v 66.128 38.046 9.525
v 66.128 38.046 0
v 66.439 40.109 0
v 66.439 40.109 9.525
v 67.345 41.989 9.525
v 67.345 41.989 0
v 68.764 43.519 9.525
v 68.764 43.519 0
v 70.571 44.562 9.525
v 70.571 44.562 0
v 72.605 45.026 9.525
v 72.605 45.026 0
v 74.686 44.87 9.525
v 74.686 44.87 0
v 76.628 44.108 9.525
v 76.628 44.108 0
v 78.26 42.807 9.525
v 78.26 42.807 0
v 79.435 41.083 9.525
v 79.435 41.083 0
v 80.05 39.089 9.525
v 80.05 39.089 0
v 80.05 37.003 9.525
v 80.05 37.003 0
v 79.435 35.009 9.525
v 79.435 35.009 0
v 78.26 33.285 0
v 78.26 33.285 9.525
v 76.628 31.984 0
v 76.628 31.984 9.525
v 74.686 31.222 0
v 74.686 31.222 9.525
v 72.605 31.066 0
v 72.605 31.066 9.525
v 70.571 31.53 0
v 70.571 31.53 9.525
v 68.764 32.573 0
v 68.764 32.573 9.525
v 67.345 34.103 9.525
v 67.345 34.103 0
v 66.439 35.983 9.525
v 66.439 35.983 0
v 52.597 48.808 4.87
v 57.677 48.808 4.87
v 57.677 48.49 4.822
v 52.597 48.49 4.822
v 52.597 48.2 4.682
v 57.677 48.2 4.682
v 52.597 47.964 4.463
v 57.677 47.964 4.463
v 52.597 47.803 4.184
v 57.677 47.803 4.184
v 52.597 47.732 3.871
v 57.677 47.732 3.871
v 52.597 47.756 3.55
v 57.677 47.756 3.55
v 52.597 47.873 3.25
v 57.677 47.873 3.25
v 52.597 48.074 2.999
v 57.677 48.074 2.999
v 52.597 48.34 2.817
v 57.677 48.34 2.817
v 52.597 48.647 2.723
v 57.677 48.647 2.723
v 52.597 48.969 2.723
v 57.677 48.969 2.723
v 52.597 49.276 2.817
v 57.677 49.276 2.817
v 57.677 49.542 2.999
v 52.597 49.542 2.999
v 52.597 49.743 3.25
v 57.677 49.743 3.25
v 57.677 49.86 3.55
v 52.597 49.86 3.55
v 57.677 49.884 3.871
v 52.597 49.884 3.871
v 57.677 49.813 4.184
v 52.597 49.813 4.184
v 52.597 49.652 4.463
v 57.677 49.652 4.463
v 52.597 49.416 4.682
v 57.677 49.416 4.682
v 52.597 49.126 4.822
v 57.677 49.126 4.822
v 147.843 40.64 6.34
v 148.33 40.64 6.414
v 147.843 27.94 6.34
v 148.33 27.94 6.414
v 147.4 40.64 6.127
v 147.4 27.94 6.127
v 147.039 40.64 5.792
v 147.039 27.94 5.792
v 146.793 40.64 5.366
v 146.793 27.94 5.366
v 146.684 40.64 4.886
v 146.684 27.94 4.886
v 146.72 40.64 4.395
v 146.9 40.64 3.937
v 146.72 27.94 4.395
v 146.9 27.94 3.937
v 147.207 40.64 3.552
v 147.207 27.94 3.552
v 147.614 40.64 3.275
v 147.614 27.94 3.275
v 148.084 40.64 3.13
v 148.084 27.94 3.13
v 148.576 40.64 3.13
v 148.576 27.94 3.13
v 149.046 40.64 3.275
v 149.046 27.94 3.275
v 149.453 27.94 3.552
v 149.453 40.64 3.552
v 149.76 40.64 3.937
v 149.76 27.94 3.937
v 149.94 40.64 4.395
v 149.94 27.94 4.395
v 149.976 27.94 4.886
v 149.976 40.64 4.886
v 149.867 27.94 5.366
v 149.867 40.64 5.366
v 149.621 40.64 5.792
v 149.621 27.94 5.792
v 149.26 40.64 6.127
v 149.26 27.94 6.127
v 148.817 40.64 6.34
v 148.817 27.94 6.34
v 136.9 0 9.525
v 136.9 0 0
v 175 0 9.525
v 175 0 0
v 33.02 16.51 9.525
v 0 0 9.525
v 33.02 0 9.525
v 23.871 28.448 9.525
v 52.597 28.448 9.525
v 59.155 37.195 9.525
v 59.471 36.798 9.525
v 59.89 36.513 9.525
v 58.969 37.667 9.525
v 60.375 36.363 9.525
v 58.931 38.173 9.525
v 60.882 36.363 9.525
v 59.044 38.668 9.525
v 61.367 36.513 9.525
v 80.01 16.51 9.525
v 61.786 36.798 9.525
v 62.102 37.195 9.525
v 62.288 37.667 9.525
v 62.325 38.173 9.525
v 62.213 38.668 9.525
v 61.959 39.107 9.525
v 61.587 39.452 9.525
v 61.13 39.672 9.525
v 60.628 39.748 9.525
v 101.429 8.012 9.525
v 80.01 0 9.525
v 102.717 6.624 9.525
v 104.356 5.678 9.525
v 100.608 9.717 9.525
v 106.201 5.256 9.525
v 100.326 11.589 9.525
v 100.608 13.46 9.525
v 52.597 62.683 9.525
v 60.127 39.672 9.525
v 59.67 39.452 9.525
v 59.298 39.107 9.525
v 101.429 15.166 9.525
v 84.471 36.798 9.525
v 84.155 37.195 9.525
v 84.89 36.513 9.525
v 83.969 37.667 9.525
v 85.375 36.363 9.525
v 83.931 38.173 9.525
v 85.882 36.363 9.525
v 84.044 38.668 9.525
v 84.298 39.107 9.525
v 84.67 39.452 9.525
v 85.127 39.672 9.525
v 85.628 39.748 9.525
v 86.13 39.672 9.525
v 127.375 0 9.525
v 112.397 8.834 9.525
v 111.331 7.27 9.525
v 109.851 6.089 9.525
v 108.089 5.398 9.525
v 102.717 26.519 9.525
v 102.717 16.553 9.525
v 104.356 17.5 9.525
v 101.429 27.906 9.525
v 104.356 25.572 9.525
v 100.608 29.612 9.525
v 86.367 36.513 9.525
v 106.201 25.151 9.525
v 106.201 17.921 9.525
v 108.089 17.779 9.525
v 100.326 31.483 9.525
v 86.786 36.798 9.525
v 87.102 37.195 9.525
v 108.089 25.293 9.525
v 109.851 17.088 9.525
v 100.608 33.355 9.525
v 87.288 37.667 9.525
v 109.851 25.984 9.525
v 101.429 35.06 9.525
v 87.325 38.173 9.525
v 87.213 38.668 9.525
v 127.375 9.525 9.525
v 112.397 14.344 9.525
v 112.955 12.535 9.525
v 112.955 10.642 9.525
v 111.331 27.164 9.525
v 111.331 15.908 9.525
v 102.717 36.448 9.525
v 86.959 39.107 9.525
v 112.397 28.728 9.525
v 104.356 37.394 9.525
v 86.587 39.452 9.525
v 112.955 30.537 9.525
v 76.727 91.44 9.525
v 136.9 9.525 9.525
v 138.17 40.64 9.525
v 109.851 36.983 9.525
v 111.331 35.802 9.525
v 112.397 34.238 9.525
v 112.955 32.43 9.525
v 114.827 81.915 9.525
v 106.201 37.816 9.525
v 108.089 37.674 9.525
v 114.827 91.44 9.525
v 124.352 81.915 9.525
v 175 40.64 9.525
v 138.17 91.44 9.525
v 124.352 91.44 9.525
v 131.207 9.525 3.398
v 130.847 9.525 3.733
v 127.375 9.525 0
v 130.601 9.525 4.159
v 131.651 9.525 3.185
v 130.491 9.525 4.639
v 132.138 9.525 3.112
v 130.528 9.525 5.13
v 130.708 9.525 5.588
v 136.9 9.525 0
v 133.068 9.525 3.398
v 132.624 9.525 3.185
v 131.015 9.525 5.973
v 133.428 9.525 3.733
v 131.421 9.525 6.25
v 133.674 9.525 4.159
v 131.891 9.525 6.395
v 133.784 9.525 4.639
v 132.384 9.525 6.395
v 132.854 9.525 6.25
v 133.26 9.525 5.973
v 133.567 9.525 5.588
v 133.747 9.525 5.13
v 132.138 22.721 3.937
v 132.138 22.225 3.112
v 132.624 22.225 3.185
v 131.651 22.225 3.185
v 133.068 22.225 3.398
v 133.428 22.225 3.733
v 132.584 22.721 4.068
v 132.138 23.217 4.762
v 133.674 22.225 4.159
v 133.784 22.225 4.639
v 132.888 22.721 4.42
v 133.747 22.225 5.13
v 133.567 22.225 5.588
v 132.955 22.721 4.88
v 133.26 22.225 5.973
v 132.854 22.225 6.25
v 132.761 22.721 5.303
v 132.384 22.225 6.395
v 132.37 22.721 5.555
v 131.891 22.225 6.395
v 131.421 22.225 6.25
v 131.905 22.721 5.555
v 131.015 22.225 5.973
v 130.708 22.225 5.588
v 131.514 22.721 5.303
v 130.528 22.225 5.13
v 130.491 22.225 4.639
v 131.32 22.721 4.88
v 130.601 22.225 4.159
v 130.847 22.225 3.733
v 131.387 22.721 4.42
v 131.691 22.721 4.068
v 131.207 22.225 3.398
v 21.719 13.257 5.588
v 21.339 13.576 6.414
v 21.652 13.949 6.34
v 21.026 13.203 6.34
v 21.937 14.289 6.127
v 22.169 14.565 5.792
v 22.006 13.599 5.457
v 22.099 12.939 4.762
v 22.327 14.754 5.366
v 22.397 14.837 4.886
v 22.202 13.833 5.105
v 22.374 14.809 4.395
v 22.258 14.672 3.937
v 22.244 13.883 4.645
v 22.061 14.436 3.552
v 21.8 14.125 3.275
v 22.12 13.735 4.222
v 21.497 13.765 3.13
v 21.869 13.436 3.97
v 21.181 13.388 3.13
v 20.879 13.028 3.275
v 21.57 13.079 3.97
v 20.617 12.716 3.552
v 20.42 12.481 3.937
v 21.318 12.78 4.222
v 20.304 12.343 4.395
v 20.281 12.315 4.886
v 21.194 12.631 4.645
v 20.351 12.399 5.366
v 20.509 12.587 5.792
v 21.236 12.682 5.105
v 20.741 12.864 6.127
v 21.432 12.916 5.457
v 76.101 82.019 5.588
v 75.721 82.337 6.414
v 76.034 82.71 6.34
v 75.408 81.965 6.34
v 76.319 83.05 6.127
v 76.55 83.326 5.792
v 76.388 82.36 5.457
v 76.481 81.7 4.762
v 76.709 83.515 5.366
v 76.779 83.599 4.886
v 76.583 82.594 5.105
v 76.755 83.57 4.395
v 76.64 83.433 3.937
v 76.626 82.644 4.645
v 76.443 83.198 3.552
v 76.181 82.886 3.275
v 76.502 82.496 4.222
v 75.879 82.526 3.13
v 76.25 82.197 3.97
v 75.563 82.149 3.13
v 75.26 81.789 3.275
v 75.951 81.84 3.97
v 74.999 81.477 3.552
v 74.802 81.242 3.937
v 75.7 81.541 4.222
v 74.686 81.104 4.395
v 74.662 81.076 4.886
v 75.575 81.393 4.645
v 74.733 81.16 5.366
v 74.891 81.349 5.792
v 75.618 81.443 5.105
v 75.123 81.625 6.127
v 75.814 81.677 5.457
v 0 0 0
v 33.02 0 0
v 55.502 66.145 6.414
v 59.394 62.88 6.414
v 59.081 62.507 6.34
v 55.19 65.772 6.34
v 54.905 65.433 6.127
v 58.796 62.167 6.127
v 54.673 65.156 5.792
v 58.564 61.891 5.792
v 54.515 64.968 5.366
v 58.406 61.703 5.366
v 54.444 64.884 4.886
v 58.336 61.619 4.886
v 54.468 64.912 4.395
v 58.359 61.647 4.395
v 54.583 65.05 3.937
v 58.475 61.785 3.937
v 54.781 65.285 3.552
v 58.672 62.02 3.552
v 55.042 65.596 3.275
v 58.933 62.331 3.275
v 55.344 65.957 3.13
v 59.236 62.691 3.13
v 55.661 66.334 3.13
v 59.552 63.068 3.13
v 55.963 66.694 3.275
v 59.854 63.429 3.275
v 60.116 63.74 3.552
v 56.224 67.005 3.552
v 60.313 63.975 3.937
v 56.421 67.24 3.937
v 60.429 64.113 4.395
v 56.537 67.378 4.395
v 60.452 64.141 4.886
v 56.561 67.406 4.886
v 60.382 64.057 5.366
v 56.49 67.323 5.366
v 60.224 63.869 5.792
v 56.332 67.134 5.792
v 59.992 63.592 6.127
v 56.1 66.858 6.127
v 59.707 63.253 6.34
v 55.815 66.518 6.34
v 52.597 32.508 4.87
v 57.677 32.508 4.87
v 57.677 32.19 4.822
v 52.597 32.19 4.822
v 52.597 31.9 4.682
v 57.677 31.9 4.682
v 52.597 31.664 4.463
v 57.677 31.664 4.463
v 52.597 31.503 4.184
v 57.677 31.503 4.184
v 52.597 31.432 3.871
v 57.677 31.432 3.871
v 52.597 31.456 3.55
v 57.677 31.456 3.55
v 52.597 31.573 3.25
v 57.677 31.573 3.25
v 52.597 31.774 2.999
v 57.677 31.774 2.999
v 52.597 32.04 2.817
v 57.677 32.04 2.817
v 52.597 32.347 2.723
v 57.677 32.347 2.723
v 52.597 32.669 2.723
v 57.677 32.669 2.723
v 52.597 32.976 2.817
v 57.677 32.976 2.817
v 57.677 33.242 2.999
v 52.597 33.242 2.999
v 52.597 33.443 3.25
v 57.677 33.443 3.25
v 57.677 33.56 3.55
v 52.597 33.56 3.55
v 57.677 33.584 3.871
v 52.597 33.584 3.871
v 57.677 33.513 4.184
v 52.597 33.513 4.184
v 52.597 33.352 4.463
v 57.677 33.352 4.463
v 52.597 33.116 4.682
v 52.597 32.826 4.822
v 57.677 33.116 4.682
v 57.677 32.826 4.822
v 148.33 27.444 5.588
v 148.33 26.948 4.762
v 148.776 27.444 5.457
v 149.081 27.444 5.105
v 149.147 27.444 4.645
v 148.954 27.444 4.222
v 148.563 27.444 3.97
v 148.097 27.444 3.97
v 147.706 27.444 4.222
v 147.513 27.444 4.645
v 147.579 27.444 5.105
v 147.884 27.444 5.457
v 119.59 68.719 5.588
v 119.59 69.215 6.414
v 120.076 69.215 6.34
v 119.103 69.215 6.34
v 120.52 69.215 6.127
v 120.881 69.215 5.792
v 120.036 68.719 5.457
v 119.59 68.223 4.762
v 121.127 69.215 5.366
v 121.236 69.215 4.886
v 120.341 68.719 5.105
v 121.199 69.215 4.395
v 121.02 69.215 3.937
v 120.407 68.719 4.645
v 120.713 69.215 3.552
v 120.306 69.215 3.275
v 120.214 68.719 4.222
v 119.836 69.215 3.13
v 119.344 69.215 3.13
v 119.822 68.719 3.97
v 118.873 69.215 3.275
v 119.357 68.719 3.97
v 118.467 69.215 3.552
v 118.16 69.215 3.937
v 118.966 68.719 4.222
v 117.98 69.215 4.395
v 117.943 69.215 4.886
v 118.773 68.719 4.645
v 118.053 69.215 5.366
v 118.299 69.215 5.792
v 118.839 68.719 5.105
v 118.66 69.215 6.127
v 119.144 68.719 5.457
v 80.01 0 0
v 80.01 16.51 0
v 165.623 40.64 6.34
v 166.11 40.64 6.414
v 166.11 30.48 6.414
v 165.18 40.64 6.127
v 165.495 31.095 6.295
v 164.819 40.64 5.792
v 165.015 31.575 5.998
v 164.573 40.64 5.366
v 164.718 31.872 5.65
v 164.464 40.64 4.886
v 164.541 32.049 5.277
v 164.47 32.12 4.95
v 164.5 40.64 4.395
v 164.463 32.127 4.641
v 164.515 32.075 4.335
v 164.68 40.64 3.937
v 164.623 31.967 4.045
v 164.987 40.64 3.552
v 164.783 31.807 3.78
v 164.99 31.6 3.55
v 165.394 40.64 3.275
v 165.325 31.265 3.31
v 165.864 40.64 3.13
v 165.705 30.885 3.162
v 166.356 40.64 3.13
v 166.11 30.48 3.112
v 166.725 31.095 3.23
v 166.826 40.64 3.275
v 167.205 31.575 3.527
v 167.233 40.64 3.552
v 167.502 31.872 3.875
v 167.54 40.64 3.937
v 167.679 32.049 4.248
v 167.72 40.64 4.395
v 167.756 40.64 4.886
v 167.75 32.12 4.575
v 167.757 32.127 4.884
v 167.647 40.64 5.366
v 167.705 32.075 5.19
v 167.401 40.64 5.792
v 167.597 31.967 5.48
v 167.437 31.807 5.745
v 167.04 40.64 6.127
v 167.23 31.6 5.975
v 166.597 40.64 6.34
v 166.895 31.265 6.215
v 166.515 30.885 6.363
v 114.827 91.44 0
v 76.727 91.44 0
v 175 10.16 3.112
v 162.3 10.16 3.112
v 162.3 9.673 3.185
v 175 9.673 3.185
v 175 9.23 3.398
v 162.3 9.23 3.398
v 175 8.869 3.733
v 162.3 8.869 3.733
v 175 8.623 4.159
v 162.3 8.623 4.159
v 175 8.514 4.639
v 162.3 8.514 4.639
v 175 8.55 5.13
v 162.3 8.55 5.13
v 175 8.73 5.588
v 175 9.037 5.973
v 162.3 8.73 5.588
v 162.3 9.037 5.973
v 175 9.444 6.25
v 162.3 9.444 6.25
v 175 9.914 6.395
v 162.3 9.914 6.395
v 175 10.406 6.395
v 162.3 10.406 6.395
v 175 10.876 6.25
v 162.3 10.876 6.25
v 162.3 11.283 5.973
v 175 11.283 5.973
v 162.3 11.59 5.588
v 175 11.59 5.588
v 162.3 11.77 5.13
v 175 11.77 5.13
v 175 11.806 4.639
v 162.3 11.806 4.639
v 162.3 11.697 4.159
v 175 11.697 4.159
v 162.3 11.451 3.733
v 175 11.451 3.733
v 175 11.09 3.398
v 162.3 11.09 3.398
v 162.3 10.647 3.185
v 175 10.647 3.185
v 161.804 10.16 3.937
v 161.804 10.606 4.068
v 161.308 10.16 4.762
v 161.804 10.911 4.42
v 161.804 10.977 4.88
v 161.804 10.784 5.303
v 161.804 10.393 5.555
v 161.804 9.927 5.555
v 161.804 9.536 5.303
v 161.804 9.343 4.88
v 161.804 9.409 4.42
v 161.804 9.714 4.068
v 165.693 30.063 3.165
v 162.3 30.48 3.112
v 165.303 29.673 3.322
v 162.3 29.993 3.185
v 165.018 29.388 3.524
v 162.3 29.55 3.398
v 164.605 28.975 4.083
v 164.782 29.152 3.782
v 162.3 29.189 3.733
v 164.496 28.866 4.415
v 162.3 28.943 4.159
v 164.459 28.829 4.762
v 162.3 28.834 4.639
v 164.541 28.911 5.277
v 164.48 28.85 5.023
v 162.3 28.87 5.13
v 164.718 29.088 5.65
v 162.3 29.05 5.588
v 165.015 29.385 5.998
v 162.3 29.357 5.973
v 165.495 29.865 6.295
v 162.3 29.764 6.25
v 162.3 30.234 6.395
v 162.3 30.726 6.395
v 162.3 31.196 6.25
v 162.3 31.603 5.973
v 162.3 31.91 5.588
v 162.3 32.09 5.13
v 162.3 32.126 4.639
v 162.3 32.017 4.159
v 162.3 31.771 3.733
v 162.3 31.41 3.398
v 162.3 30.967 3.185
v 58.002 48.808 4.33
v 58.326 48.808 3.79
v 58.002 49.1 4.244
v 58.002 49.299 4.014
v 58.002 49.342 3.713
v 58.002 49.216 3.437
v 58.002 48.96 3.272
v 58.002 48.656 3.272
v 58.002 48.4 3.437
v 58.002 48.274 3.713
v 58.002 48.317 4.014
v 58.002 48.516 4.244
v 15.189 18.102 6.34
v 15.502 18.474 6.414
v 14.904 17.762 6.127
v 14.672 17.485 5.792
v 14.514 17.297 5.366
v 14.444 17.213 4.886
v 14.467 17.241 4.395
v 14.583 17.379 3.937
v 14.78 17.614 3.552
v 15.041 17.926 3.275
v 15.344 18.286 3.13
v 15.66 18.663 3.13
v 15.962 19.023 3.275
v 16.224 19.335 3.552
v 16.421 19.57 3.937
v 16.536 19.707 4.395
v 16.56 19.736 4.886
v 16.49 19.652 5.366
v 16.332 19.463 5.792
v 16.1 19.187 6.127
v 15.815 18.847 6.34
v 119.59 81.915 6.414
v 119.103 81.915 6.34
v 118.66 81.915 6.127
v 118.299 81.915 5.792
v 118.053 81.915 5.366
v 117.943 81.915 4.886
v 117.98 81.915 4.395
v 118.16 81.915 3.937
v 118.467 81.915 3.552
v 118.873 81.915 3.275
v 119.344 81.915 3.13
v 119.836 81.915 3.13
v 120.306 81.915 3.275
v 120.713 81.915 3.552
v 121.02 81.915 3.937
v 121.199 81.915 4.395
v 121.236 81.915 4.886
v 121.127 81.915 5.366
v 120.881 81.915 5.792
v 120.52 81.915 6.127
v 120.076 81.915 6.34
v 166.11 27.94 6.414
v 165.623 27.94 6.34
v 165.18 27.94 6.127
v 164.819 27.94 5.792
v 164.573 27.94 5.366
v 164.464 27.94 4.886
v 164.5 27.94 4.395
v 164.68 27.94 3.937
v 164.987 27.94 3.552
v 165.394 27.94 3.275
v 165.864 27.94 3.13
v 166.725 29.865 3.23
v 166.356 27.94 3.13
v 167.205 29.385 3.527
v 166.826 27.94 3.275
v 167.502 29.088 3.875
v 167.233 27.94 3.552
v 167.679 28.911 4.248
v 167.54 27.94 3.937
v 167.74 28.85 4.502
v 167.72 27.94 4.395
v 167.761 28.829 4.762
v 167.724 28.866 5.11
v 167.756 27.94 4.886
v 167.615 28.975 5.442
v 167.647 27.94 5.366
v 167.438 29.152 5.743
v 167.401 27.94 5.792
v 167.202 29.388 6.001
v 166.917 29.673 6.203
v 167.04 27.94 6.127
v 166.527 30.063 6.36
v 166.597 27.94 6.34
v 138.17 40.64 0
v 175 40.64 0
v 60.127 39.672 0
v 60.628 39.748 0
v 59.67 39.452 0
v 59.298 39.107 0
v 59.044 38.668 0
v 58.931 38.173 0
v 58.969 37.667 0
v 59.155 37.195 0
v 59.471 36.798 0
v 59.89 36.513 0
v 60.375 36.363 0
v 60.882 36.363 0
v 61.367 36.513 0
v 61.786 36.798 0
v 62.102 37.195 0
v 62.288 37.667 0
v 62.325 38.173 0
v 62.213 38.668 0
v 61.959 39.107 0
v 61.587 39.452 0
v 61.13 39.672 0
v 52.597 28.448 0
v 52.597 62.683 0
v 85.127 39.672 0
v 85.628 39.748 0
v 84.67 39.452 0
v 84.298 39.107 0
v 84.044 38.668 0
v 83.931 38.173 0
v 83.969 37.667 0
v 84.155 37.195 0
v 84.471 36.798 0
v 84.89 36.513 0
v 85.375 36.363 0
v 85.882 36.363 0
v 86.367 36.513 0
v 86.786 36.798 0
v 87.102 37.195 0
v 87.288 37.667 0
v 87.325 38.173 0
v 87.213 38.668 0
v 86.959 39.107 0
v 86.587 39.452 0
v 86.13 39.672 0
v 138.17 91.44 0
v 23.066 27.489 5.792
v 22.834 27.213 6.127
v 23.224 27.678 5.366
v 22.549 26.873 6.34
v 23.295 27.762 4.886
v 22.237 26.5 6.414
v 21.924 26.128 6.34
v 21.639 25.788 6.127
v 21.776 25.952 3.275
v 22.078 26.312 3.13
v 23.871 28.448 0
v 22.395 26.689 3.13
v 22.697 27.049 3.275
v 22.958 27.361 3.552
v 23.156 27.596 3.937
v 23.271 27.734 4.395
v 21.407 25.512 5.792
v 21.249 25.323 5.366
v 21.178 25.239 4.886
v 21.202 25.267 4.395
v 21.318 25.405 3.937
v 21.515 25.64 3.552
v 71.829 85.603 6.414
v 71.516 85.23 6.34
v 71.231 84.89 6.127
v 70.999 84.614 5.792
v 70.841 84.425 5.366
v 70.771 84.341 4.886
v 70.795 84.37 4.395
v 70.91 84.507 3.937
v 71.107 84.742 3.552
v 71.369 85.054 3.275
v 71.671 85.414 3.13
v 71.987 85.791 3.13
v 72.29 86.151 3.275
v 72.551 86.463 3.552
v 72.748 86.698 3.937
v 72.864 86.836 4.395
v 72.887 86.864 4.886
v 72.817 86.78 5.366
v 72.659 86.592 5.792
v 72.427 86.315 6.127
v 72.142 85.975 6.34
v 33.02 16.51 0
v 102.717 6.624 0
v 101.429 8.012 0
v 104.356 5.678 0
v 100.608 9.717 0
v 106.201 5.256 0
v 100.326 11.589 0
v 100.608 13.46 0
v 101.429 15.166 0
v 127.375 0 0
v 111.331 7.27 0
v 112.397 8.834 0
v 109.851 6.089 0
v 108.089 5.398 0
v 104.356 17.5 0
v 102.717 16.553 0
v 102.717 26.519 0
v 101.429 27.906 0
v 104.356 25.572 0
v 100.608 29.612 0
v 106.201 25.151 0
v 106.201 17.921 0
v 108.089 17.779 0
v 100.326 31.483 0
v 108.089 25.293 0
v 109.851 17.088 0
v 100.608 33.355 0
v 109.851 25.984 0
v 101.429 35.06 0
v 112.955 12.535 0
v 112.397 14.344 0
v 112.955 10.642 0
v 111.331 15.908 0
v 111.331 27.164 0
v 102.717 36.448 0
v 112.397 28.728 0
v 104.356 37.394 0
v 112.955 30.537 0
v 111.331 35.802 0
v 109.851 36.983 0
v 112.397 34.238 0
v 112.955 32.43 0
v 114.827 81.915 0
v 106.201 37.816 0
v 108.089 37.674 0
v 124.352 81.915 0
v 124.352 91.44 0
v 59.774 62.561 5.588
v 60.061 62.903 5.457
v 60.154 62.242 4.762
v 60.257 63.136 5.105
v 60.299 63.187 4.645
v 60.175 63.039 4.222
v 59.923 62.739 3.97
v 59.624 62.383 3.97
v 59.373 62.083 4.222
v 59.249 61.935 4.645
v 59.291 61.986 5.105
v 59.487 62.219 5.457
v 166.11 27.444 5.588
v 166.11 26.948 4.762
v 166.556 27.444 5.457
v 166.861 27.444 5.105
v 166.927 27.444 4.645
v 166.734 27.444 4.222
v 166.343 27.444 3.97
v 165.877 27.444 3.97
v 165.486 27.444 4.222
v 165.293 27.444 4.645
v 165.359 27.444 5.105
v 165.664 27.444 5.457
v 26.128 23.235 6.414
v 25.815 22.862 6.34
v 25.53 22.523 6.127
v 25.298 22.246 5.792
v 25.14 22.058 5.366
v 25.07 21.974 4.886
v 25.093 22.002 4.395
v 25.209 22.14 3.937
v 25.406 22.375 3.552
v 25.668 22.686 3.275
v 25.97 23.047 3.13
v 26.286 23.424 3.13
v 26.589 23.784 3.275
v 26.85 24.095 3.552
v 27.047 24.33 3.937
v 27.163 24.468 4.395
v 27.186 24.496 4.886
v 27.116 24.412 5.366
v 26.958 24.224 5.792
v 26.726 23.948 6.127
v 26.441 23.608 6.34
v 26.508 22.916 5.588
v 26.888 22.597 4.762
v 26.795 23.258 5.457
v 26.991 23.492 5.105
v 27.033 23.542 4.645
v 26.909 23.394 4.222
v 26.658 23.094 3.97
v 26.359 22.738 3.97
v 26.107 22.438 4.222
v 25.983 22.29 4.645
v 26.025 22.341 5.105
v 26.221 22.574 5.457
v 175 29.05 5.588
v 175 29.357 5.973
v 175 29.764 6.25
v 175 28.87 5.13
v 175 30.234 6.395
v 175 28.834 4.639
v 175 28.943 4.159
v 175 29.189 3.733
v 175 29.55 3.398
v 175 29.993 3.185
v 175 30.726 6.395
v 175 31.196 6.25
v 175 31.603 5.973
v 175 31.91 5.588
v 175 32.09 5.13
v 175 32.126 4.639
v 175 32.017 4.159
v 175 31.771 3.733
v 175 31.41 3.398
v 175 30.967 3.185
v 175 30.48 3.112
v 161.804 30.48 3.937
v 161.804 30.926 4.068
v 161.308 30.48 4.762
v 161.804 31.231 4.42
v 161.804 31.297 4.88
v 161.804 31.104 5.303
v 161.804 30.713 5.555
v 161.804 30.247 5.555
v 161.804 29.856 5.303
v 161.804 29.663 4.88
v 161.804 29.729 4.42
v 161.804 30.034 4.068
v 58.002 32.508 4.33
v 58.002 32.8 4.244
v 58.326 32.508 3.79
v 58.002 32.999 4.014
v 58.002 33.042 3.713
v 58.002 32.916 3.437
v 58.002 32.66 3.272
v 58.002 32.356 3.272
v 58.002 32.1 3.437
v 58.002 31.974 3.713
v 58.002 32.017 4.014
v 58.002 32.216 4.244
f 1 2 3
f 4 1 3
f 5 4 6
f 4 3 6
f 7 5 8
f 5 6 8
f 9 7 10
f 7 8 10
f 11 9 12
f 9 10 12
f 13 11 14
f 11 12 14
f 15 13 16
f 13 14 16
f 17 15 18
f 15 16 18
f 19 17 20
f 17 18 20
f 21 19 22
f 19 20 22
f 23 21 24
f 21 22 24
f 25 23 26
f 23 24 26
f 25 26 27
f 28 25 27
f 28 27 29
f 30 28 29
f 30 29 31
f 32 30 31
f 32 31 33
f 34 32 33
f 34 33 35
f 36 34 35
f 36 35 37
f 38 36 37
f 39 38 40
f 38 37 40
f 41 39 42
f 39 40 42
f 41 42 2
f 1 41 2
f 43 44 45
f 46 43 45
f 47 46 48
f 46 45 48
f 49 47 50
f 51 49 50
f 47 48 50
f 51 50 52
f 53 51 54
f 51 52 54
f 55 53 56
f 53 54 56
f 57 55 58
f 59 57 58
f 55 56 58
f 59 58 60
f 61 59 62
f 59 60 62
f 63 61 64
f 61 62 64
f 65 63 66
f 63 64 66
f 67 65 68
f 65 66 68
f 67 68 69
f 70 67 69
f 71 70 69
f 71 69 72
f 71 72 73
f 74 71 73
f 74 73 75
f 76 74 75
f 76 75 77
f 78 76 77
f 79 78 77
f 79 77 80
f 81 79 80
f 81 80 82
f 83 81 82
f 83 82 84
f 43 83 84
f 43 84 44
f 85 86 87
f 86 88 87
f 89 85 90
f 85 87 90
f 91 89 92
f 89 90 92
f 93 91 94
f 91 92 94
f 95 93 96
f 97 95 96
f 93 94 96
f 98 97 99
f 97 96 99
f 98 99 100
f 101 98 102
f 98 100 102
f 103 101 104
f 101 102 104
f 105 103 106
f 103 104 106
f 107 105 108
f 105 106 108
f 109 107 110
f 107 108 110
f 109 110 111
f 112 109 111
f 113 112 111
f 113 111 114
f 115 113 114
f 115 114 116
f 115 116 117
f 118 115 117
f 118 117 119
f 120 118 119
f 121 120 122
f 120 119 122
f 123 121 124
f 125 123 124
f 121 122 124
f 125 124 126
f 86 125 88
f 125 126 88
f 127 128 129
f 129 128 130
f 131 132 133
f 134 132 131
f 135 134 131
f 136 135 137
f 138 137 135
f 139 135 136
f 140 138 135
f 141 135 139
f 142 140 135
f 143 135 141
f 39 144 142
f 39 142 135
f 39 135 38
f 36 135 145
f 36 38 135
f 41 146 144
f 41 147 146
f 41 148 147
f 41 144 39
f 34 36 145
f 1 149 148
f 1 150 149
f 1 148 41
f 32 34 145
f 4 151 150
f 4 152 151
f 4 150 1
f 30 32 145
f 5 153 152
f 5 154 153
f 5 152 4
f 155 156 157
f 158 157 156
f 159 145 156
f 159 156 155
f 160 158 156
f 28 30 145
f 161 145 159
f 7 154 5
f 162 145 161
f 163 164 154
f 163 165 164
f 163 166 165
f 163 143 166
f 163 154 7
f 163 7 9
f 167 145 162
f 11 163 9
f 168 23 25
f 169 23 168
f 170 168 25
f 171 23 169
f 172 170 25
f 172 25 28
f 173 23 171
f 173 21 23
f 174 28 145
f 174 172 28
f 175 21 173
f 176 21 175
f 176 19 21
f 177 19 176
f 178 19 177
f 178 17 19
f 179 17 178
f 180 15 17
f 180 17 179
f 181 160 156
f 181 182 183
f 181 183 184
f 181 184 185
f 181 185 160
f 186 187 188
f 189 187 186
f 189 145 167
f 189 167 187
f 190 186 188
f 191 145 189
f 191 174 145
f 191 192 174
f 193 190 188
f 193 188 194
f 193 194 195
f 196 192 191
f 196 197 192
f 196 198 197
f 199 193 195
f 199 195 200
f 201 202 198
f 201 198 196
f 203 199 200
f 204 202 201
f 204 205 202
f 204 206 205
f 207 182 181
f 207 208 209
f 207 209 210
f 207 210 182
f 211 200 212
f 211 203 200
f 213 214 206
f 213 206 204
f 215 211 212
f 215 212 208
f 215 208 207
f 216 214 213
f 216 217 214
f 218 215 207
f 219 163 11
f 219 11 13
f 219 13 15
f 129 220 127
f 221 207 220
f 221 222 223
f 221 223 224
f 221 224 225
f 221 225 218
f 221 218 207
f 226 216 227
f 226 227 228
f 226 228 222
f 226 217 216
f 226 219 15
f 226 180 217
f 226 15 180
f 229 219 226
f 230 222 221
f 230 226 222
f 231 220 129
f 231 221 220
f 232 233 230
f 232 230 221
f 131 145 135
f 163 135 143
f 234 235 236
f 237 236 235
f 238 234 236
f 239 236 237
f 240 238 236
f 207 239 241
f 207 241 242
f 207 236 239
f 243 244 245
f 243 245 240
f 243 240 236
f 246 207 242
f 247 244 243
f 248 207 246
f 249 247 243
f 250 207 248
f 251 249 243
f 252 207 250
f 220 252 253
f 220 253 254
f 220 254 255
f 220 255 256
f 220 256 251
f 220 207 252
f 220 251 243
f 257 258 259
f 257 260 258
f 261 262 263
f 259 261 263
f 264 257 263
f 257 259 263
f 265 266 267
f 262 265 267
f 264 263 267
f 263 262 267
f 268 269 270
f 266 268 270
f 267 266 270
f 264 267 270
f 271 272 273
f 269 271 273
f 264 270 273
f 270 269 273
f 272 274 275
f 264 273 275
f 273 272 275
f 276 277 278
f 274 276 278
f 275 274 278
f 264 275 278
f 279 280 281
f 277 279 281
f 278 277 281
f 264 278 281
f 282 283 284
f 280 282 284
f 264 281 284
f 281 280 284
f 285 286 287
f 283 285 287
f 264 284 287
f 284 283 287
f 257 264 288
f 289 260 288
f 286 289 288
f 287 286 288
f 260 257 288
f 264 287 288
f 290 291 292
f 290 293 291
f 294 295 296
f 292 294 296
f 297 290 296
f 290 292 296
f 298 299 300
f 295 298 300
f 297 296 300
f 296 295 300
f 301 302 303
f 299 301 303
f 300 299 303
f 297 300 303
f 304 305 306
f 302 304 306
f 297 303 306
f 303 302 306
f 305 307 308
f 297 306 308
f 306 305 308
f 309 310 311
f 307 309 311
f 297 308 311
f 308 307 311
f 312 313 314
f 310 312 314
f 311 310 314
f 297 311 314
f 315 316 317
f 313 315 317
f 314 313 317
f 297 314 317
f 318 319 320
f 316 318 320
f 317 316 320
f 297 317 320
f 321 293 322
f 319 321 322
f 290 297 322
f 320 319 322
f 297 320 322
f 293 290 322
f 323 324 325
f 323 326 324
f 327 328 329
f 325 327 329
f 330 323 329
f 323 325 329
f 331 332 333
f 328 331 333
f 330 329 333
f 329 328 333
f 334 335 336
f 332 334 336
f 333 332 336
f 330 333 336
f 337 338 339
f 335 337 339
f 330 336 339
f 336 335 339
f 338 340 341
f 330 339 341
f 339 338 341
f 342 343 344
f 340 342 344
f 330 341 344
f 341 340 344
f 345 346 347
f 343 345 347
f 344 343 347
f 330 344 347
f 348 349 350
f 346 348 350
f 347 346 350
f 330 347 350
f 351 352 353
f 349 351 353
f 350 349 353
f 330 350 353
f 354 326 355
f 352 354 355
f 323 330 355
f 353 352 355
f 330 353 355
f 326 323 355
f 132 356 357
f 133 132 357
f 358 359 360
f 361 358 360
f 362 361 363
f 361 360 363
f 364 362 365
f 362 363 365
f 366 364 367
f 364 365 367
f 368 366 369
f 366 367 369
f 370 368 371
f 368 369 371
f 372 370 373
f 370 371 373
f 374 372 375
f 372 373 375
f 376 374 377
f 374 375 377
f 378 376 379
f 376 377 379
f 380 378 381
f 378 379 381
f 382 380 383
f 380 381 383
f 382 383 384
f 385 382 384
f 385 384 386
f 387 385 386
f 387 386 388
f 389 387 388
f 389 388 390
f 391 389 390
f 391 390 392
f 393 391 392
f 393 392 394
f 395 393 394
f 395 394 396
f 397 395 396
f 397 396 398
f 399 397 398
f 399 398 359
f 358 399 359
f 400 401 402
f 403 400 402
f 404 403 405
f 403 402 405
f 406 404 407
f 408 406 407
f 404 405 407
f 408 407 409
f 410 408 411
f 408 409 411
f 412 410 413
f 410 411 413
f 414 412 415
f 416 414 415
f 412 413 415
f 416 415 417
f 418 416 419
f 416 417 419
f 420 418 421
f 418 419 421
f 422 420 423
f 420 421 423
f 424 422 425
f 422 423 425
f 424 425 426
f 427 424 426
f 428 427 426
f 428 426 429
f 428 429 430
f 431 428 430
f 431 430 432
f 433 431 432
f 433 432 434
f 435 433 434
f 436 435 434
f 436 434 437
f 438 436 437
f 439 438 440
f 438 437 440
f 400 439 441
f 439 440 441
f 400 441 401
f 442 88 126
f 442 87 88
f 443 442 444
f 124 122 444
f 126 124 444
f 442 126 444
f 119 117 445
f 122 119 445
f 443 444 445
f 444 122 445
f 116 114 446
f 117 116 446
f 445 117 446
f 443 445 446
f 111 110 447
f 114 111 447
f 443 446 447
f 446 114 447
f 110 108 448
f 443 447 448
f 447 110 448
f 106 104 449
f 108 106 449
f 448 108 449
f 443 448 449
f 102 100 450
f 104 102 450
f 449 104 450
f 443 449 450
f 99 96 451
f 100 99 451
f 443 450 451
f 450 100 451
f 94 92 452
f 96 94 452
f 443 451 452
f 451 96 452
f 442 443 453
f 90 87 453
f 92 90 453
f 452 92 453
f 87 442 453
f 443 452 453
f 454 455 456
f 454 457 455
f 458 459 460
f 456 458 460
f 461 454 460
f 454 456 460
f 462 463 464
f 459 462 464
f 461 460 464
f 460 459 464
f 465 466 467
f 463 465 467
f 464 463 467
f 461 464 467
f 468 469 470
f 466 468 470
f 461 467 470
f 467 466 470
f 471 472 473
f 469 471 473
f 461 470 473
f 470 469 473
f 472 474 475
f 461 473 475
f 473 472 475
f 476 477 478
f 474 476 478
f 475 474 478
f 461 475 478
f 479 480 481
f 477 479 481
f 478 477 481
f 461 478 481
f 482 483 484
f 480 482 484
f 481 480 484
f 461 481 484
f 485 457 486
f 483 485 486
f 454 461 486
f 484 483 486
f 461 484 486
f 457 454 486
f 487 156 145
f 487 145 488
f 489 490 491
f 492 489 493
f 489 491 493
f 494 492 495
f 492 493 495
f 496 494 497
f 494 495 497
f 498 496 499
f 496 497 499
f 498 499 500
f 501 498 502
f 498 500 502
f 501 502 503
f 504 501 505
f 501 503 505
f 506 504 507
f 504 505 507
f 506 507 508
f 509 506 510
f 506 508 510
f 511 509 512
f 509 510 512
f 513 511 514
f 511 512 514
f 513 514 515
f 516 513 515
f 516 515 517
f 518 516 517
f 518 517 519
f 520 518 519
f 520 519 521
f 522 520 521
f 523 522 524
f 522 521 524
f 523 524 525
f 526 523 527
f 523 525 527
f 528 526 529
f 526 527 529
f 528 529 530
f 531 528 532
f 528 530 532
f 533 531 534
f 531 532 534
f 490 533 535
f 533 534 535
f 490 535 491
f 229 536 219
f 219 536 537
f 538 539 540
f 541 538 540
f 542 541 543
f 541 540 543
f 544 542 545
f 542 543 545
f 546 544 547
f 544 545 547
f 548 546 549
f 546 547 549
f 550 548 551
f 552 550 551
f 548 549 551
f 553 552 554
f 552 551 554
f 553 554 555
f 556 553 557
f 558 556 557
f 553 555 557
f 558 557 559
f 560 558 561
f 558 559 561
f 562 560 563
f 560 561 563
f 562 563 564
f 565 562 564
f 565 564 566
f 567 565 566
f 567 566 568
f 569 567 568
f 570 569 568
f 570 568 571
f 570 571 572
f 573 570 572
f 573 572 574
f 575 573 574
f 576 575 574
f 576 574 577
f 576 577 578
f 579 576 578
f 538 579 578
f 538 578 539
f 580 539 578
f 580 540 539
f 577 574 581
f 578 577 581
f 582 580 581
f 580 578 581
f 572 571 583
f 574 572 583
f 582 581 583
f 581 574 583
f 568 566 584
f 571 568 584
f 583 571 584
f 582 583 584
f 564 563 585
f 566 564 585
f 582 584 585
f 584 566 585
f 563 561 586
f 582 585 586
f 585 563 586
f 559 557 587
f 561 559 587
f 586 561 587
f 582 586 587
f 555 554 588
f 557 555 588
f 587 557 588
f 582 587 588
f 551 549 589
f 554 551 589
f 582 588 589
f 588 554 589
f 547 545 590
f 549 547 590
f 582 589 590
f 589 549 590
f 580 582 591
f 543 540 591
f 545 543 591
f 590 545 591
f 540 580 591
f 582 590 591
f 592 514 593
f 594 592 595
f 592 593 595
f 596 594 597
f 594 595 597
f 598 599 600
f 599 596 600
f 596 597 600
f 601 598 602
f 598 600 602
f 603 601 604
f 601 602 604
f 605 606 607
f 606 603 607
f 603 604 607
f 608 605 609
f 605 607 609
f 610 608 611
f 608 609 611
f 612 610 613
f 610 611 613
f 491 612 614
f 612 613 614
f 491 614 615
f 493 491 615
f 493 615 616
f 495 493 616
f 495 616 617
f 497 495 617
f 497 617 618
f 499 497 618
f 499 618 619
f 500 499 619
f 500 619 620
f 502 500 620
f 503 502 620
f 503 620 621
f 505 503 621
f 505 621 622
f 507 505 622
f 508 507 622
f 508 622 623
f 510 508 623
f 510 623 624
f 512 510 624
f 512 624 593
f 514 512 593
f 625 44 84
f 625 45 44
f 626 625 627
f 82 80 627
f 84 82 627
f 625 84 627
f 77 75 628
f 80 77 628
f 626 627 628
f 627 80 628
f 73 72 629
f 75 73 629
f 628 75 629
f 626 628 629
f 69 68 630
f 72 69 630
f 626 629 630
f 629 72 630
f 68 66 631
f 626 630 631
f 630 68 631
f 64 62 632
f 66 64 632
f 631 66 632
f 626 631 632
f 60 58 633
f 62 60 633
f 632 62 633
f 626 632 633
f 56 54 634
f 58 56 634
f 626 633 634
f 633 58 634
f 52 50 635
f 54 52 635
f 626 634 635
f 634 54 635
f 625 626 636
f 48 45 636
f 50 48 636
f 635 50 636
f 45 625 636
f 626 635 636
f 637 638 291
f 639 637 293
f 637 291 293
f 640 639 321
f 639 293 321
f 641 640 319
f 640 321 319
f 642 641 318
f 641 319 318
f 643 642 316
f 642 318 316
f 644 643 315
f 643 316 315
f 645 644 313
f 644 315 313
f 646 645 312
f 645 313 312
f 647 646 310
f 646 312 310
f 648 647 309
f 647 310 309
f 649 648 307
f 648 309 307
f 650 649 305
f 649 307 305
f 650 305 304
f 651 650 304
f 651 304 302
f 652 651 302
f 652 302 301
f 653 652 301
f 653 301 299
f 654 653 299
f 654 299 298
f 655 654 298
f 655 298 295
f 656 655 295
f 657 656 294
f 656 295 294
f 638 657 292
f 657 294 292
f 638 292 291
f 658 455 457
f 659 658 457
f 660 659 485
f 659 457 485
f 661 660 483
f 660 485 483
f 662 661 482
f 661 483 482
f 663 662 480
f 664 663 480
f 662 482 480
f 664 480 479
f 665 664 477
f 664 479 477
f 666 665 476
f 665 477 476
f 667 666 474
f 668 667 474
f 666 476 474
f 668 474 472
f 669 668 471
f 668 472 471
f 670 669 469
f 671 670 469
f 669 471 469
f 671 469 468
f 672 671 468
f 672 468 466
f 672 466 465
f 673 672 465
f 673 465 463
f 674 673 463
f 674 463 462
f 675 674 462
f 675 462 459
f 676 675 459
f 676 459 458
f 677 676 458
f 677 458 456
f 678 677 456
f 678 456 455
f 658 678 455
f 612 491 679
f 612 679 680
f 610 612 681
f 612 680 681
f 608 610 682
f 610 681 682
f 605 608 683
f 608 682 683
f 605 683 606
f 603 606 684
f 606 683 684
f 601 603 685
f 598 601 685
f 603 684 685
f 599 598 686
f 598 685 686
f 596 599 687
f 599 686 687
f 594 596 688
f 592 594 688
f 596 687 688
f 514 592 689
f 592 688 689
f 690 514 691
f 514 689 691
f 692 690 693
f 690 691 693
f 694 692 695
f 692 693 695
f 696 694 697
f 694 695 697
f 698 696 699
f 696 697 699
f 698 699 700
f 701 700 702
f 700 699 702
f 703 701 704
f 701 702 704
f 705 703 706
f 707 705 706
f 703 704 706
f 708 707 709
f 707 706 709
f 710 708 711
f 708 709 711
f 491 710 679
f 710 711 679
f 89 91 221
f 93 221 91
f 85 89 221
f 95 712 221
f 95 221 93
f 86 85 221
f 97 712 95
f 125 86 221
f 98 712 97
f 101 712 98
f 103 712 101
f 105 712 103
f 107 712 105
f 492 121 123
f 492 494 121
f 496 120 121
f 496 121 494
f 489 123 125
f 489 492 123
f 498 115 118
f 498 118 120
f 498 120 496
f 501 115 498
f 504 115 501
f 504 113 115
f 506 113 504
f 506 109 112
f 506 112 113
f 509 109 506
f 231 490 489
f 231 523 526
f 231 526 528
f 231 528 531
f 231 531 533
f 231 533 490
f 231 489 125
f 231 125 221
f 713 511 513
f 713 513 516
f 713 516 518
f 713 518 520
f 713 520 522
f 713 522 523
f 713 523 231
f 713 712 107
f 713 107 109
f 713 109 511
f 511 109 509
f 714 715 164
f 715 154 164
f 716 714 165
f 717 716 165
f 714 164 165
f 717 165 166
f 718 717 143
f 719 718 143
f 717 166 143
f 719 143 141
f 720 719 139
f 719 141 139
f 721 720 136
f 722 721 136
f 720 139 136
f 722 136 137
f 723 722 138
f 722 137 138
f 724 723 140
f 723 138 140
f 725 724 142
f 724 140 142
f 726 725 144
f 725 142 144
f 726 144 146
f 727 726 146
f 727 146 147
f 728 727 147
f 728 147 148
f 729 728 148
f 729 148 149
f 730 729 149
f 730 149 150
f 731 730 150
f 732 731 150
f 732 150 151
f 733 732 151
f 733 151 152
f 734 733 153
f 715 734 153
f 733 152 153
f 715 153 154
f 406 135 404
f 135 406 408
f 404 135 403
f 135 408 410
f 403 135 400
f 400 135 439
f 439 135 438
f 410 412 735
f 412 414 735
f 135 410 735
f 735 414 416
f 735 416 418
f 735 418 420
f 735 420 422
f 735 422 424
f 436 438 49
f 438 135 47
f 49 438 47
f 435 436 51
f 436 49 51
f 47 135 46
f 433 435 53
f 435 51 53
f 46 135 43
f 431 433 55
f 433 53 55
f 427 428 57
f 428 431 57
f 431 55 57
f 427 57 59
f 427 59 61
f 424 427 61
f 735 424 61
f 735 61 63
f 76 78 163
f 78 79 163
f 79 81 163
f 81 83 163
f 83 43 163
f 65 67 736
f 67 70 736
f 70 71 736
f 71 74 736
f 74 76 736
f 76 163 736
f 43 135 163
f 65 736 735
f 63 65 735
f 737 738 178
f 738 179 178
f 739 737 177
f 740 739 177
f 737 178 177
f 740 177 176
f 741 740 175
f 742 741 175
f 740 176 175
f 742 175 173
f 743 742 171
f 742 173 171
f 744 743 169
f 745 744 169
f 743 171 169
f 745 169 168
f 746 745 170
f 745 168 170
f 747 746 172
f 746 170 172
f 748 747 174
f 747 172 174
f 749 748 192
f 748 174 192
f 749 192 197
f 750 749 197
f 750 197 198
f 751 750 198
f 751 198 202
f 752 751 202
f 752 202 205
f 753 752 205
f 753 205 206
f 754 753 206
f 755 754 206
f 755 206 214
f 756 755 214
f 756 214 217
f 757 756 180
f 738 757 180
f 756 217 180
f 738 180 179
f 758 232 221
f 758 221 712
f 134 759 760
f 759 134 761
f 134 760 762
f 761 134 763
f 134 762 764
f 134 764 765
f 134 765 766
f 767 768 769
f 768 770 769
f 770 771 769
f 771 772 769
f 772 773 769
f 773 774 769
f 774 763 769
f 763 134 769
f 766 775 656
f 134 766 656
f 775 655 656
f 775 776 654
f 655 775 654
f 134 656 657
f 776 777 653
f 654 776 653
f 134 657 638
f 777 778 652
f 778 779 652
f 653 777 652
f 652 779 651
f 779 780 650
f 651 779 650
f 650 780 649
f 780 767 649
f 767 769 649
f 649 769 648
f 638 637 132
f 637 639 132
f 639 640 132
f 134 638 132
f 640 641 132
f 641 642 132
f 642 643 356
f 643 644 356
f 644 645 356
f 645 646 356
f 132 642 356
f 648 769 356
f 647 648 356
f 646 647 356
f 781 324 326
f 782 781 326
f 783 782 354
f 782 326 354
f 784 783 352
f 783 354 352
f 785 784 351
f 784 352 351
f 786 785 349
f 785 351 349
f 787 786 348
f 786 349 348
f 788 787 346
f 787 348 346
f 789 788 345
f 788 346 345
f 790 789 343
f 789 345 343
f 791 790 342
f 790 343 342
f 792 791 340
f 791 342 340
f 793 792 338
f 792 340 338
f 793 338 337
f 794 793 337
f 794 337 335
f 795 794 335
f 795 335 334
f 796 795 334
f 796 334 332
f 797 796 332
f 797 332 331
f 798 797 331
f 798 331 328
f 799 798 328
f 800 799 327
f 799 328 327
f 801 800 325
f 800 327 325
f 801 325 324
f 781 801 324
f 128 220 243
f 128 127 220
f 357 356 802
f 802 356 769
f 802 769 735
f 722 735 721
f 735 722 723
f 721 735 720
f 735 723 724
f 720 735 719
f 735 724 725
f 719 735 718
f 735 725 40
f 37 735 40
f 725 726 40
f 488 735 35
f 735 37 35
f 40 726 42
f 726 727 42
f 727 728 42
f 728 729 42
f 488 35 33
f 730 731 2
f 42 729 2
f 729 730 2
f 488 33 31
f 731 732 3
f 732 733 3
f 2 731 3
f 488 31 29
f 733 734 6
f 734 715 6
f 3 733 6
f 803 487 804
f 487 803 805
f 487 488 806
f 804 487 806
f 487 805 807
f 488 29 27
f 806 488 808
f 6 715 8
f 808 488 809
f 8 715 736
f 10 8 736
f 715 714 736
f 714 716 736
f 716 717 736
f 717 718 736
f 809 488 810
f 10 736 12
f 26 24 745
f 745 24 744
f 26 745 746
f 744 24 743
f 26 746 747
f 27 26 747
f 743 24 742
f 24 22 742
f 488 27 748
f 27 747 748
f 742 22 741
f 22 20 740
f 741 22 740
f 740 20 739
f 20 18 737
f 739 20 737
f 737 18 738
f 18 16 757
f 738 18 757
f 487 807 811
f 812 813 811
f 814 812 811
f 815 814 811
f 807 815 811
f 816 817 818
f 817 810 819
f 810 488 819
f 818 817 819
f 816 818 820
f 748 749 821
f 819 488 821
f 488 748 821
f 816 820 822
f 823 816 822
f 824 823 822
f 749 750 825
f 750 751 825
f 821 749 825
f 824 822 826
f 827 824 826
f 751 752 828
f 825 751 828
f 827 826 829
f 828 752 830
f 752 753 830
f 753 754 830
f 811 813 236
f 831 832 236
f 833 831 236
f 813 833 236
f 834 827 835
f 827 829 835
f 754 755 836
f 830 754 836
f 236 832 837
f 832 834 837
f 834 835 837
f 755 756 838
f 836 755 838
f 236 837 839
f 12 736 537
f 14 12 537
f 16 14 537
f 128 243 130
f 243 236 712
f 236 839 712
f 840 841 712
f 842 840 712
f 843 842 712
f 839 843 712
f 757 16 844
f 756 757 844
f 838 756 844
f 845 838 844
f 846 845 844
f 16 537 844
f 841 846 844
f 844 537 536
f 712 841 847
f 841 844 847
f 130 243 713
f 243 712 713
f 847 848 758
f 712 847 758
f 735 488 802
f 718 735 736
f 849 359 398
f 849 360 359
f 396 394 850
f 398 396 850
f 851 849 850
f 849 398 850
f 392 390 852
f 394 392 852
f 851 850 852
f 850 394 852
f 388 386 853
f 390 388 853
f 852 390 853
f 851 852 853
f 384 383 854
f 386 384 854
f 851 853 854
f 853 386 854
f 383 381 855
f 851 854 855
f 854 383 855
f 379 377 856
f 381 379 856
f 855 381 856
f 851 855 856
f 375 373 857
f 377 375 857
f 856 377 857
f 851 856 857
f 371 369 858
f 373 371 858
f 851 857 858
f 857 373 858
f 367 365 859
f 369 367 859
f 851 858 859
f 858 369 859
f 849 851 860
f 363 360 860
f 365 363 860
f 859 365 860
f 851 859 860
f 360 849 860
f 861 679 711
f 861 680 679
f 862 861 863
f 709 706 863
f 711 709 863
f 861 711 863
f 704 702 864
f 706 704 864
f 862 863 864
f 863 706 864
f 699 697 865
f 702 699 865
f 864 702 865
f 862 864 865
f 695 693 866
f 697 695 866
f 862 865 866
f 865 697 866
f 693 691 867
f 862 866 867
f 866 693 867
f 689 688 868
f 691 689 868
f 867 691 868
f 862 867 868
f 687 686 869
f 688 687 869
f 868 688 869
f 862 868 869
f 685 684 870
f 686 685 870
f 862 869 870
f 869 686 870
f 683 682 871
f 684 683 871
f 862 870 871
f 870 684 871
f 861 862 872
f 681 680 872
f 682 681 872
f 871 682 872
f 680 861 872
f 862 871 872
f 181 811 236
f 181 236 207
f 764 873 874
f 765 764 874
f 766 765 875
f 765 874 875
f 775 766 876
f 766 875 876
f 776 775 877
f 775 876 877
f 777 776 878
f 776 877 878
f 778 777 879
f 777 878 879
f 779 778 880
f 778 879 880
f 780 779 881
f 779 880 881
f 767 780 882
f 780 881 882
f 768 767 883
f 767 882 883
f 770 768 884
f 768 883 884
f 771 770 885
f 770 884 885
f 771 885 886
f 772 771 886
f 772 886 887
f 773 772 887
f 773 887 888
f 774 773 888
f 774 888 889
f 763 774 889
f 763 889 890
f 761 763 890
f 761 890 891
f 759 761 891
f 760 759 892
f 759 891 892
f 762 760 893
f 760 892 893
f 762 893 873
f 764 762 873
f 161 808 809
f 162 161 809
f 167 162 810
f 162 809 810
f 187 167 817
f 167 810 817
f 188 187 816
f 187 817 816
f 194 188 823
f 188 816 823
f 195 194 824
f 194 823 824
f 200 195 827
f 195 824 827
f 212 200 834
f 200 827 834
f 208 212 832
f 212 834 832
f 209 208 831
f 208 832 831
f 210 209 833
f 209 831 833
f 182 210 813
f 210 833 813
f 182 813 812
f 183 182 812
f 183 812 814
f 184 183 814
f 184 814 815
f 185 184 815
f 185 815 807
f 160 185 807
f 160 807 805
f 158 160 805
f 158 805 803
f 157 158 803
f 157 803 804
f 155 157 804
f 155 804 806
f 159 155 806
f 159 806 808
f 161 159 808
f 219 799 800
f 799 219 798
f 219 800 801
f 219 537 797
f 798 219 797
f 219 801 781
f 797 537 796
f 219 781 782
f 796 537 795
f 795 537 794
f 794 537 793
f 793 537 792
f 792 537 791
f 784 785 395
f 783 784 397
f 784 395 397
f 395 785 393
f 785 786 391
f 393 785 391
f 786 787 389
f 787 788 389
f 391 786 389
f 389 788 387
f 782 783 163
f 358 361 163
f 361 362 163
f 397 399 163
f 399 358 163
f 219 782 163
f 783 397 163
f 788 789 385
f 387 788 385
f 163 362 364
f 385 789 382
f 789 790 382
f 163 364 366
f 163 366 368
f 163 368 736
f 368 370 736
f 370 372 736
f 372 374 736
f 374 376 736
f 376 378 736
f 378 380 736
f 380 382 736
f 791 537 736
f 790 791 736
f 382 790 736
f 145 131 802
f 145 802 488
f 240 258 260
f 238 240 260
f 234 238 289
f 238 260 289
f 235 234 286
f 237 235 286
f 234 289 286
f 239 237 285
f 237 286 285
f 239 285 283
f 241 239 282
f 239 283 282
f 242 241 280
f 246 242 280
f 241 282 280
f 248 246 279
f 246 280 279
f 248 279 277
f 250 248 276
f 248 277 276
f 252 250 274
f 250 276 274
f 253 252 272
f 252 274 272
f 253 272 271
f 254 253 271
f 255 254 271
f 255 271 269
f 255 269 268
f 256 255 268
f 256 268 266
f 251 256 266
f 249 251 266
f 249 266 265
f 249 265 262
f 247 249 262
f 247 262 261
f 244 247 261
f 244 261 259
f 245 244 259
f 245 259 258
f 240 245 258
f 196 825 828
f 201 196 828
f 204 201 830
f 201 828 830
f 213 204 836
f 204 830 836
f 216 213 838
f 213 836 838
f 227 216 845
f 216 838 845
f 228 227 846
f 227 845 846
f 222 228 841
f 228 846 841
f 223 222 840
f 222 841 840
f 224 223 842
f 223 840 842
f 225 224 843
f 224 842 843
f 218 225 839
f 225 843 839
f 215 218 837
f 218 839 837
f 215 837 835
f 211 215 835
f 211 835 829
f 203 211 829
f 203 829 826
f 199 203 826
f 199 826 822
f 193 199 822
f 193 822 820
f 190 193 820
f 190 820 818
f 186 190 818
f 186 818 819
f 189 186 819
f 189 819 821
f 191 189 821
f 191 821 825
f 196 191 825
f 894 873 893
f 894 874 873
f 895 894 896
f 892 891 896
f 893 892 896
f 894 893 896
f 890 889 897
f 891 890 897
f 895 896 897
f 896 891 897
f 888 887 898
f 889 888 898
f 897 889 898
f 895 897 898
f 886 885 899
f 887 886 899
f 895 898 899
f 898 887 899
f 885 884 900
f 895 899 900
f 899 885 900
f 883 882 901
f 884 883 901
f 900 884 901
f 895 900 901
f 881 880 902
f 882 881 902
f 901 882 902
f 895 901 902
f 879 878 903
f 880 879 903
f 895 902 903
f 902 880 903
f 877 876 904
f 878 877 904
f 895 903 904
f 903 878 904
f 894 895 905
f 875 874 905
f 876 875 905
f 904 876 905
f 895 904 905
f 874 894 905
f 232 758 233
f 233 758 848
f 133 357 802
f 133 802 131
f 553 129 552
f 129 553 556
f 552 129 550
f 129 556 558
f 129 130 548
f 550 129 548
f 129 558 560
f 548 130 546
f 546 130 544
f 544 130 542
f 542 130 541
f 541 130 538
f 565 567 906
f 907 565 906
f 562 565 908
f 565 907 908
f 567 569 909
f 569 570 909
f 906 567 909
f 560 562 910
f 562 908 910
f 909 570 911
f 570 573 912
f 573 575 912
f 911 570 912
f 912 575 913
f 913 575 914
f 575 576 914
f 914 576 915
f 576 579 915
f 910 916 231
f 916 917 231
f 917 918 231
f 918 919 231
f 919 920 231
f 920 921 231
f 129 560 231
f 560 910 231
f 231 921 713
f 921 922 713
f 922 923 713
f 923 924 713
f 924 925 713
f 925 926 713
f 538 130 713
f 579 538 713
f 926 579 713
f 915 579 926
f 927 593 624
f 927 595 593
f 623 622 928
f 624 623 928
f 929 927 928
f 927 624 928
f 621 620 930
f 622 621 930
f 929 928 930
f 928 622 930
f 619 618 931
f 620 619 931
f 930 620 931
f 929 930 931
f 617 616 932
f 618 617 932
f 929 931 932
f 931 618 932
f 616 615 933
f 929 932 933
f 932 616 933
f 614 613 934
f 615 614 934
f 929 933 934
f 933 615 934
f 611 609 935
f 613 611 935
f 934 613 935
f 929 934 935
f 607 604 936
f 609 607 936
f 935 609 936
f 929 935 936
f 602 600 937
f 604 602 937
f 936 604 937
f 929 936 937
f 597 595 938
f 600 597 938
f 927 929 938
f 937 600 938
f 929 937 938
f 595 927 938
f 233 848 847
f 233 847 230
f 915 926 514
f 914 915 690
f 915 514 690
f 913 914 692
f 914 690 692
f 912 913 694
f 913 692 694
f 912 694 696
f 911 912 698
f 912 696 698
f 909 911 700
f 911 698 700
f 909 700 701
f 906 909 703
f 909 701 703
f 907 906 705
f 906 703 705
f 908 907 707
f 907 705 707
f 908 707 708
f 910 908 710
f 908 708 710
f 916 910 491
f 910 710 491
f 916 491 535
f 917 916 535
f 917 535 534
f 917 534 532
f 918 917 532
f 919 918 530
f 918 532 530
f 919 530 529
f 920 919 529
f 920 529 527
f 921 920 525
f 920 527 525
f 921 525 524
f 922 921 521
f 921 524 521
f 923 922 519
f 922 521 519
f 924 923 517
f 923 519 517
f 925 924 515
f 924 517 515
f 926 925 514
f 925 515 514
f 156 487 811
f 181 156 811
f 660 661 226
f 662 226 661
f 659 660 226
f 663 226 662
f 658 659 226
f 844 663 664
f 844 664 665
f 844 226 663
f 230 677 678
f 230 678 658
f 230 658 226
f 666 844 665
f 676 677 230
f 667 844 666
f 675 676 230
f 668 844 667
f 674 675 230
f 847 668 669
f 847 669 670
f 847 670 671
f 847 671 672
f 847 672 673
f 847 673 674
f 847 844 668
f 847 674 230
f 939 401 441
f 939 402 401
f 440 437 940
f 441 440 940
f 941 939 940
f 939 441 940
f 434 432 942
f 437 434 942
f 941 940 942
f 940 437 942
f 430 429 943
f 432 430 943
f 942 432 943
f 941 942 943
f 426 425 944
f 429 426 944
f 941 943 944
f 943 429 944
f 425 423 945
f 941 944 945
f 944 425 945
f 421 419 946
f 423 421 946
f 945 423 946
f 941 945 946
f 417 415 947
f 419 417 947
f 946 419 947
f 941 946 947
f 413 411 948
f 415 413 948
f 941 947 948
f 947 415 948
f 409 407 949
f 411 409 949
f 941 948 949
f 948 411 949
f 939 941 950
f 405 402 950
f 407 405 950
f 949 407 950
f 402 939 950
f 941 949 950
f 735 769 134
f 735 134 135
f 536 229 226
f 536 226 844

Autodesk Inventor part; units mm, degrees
ref_plane "YZ Plane" through (0, 0, 0) normal (1, 0, 0) x (0, 1, 0)
ref_plane "XZ Plane" through (0, 0, 0) normal (0, 1, 0) x (-1, 0, 0)
ref_plane "XY Plane" through (0, 0, 0) normal (0, 0, 1) x (1, 0, 0)
sketch "Sketch1" plane through (0, 0, 0) normal (0, 0, 1) x (1, 0, 0)
  line L0 (0, 0) -> (175, 0)
  line L1 (175, 0) -> (175, 91.44)
  line L2 (175, 91.44) -> (76.7273, 91.44)
  line L3 (76.7273, 91.44) -> (0, 0)
  dimension "d0" = 175
  dimension "d1" = 91.44
  dimension "d101" = 50
extrude "Extrusion1" add sketch "Sketch1" along normal blind 9.525
sketch "Sketch11" plane through (0, 0, 0) normal (0, 0, -1) x (-1, 0, 0)
  circle A0 centre (-106.6758, 11.5887) radius 6.35 projected
  circle A1 centre (-106.6758, 11.5887) radius 6.9469 projected
  dimension "d121" = 12.7
  dimension "d122" = 13.8938
sketch "Sketch8" plane through (0, 0, 0) normal (0, 0, -1) x (-1, 0, 0)
  circle A0 centre (-73.1284, 38.046) radius 7 projected
  dimension "d105" = 14
sketch "Sketch9" plane through (0, 0, 0) normal (0, 0, -1) x (-1, 0, 0)
  circle A0 centre (-85.6284, 38.046) radius 1.25 projected
  circle A1 centre (-60.6284, 38.046) radius 1.25 projected
extrude "Extrusion2" cut sketch "Sketch8" against normal blind 9.525
hole "Hole7" at (85.6284, 38.046, 0) at (60.6284, 38.046, 0) direction (0, 0, 1) diameter 3.4036 end through all clearance for "Flat Head Machine Screw" size "M3" standard "Ansi Metric M Profile"
sketch "Sketch10" plane through (0, 0, 0) normal (0, 0, -1) x (-1, 0, 0)
  circle A0 centre (-106.6758, 31.4833) radius 6.35 projected
  dimension "d118" = 12.7
extrude "Extrusion3" cut sketch "Sketch10" against normal blind 9.525
extrude "Extrusion4" cut sketch "Sketch11" against normal blind 9.525 contours A0
sketch "Sketch12" plane through (0, 0, 0) normal (0, -1, 0) x (1, 0, 0)
  line L0 (175, 9.525) -> (0, 9.525) projected
  line L1 (0, 0) -> (175, 0) projected
  line L2 (33.02, 9.525) -> (80.01, 9.525)
  line L3 (80.01, 9.525) -> (80.01, 0)
  line L4 (80.01, 0) -> (33.02, 0)
  line L5 (33.02, 0) -> (33.02, 9.525)
  line L6 (175, 0) -> (175, 9.525) projected
  dimension "d126" = 46.99
  dimension "d196" = 94.99
extrude "Extrusion5" cut sketch "Sketch12" against normal blind 16.51 contours L3 L1 L5 L0
sketch "Sketch13" plane through (76.7273, 91.44, 0) normal (0, 1, 0) x (1, 0, 0)
  line L0 (98.2727, 0) -> (0, 0) projected
  line L1 (61.4427, 0) -> (98.2727, 0)
  line L2 (98.2727, 0) -> (98.2727, -9.525)
  line L3 (98.2727, -9.525) -> (61.4427, -9.525)
  line L4 (61.4427, -9.525) -> (61.4427, 0)
  point P0 (-76.7273, 0)
  dimension "d129" = 36.83
extrude "Extrusion6" cut sketch "Sketch13" against normal blind 50.8
sketch "Sketch14" plane through (76.7273, 91.44, 9.525) normal (0, 1, 0) x (1, 0, 0)
  line L0 (0, 9.525) -> (0, 0) projected
  line L1 (-76.7273, 0) -> (0, 0) projected
  line L2 (0, 9.525) -> (0, 0) projected
  line L3 (0, 9.525) -> (-76.7273, 9.525) projected
  line L4 (-76.7273, 9.525) -> (-76.7273, 0) projected
  line L5 (-24.13, 9.525) -> (-125.73, 9.525)
  line L6 (-125.73, 9.525) -> (-125.73, 0)
  line L7 (-125.73, 0) -> (-24.13, 0)
  line L8 (-24.13, 0) -> (-24.13, 9.525)
  dimension "d132" = 24.13
  dimension "d133" = 101.6
extrude "Extrusion7" cut sketch "Sketch14" against normal blind 62.992 contours L8 L1 L4 L3 | L4 L7 L6 L5
sketch "Sketch15" plane through (76.7273, 91.44, 9.525) normal (0, 1, 0) x (1, 0, 0)
  line L0 (61.4427, 9.525) -> (0, 9.525) projected
  line L1 (0, 9.525) -> (0, 0) projected
  line L2 (0, 0) -> (61.4427, 0) projected
  line L3 (38.1, 9.525) -> (47.625, 9.525)
  line L4 (47.625, 9.525) -> (47.625, 0)
  line L5 (47.625, 0) -> (38.1, 0)
  line L6 (38.1, 0) -> (38.1, 9.525)
  point P0 (-76.7273, 9.525)
  dimension "d136" = 9.525
  dimension "d137" = 38.1
extrude "Extrusion8" cut sketch "Sketch15" against normal blind 9.525 contours L4 L2 L6 L0
sketch "Sketch16" plane through (175, 0, 0) normal (0, -1, 0) x (1, 0, 0)
  line L0 (-94.99, 0) -> (0, 0) projected
  line L1 (0, 0) -> (0, 9.525) projected
  line L2 (0, 9.525) -> (-94.99, 9.525) projected
  line L3 (-47.625, 9.525) -> (-38.1, 9.525)
  line L4 (-38.1, 9.525) -> (-38.1, 0)
  line L5 (-38.1, 0) -> (-47.625, 0)
  line L6 (-47.625, 0) -> (-47.625, 9.525)
  point P0 (-175, 0)
  dimension "d140" = 38.1
  dimension "d141" = 9.525
extrude "Extrusion9" cut sketch "Sketch16" against normal blind 9.525 contours L6 L2 L4 L0
sketch "Sketch17" plane through (76.7273, 81.915, 9.525) normal (0, 1, 0) x (1, 0, 0)
  circle A0 centre (42.8625, 4.7625) radius 2.2479 projected
  point P0 (-76.7273, 9.525)
hole "Hole8" at (119.5898, 81.915, 4.7625) direction (0, -1, 0) diameter 3.302 depth 12.7 tip angle 118 thread size "8-32 UNC" class "2B" standard "ANSI Unified Screw Threads"
sketch "Sketch18" plane through (175, 9.525, 0) normal (0, -1, 0) x (1, 0, 0)
  circle A0 centre (-42.8625, 4.7625) radius 2.2479 projected
  point P0 (-175, 0)
hole "Hole9" at (132.1375, 9.525, 4.7625) direction (0, 1, 0) diameter 3.302 depth 12.7 tip angle 118 thread size "8-32 UNC" class "2B" standard "ANSI Unified Screw Threads"
sketch "Sketch19" plane through (76.7273, 40.64, 0) normal (0, 1, 0) x (1, 0, 0)
  circle A0 centre (71.6027, -4.7625) radius 2.2479 projected
  circle A1 centre (89.3827, -4.7625) radius 2.2479 projected
  point P0 (-76.7273, 0)
hole "Hole10" at (148.33, 40.64, 4.7625) at (166.11, 40.64, 4.7625) direction (0, -1, 0) diameter 3.302 depth 12.7 tip angle 118 thread size "8-32 UNC" class "2B" standard "ANSI Unified Screw Threads"
sketch "Sketch20" plane through (175, 0, 9.525) normal (1, 0, 0) x (0, 0, -1)
  line L0 (9.525, 40.64) -> (0, 40.64) projected
  line L1 (9.525, 0) -> (0, 0) projected
  point P0 (4.7625, 10.16)
  point P1 (4.7625, 30.48)
  dimension "d165" = 30.48
  dimension "d166" = 10.16
  dimension "d167" = 10.16
hole "Hole11" at (175, 10.16, 4.7625) at (175, 30.48, 4.7625) direction (-1, 0, 0) diameter 3.302 depth 12.7 tip angle 118 thread size "8-32 UNC" class "2B" standard "ANSI Unified Screw Threads"
sketch "Sketch21" plane through (52.5973, 28.448, 0) normal (-1, 0, 0) x (0, 0, 1)
  circle A0 centre (3.79, 4.06) radius 1.0795 projected
  circle A1 centre (3.79, 4.06) radius 1.55 projected
  circle A2 centre (44.49, 20.36) radius 1.55 projected
  line L0 (46.99, 22.86) -> (46.99, 1.56) projected
  line L1 (1.29, 22.86) -> (46.99, 22.86) projected
  line L2 (1.29, 1.56) -> (1.29, 22.86) projected
  line L3 (46.99, 1.56) -> (1.29, 1.56) projected
  line L4 (1.29, 12.21) -> (46.99, 12.21)
  circle A3 centre (3.79, 20.36) radius 1.0795
  point P0 (0, -28.448)
hole "Hole12" at (52.5973, 48.808, 3.79) at (52.5973, 32.508, 3.79) direction (1, 0, 0) diameter 2.159 depth 5.08 tip angle 118
sketch "Sketch22" plane through (76.7273, 91.44, 0) normal (-0.7660444, 0.6427876, 0) x (0, 0, 1)
  circle A0 centre (4.7625, -7.62) radius 2.159 projected
  circle A1 centre (4.7625, -33.02) radius 2.159 projected
  circle A2 centre (4.7625, -84.7725) radius 2.2479 projected
  point P0 (0, -119.3664)
hole "Hole13" at (71.8292, 85.6027, 4.7625) at (55.5024, 66.1452, 4.7625) at (22.2366, 26.5005, 4.7625) direction (0.7660444, -0.6427876, 0) diameter 3.302 depth 5.08 tip angle 118 thread size "8-32 UNC" class "2B" standard "ANSI Unified Screw Threads"
sketch "Sketch23" plane through (0, 0, 0) normal (-0.7660444, 0.6427876, 0) x (0, 0, 1)
  circle A0 centre (4.7625, 24.1164) radius 2.159 projected
hole "Hole14" at (15.5018, 18.4743, 4.7625) direction (0.7660444, -0.6427876, 0) diameter 3.302 depth 7.62 tip angle 118 thread size "8-32 UNC" class "2B" standard "ANSI Unified Screw Threads"
properties part number "Inside Chassis3" material "Aluminum-6061"
